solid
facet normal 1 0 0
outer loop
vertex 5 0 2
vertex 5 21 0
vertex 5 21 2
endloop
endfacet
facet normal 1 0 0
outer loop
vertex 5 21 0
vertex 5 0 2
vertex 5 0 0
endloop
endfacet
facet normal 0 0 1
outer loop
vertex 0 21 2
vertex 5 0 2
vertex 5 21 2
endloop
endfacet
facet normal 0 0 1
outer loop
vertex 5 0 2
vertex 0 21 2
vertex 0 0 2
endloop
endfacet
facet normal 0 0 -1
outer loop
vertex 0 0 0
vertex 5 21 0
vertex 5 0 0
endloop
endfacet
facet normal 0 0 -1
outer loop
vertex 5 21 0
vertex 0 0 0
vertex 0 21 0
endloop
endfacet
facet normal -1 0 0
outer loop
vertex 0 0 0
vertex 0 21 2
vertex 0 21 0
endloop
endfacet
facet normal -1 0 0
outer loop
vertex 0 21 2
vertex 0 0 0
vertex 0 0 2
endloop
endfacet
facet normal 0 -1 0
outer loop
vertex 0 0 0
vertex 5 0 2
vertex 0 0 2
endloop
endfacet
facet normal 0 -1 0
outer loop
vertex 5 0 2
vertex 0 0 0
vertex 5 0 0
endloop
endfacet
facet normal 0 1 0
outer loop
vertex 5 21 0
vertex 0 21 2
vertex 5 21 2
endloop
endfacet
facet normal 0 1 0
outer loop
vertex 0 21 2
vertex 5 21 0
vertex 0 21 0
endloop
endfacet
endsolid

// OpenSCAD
translate([2.5, 1.5, 1.0]) color([0.6894664766240866, 0.932788033819558, 0.23286310478430694]) cube([5, 3, 2], center=true);
translate([2.5, 4.5, 1.0]) color([0.14188743522012004, 0.4540480681686925, 0.4766939084563374]) cube([5, 3, 2], center=true);
translate([2.5, 7.5, 1.0]) color([0.7074804824528956, 0.2582188407343454, 0.027936242271358158]) cube([5, 3, 2], center=true);
translate([2.5, 10.5, 1.0]) color([0.20812012525081536, 0.33501316214628807, 0.9609071038114427]) cube([5, 3, 2], center=true);
translate([2.5, 13.5, 1.0]) color([0.29634664160852753, 0.8784103092413238, 0.5532045188241876]) cube([5, 3, 2], center=true);
translate([2.5, 16.5, 1.0]) color([0.32698413866792275, 0.5930193960141523, 0.08080901281968078]) cube([5, 3, 2], center=true);
translate([2.5, 19.5, 1.0]) color([0.5332278801564081, 0.30776249733867533, 0.3765889324074634]) cube([5, 3, 2], center=true);
